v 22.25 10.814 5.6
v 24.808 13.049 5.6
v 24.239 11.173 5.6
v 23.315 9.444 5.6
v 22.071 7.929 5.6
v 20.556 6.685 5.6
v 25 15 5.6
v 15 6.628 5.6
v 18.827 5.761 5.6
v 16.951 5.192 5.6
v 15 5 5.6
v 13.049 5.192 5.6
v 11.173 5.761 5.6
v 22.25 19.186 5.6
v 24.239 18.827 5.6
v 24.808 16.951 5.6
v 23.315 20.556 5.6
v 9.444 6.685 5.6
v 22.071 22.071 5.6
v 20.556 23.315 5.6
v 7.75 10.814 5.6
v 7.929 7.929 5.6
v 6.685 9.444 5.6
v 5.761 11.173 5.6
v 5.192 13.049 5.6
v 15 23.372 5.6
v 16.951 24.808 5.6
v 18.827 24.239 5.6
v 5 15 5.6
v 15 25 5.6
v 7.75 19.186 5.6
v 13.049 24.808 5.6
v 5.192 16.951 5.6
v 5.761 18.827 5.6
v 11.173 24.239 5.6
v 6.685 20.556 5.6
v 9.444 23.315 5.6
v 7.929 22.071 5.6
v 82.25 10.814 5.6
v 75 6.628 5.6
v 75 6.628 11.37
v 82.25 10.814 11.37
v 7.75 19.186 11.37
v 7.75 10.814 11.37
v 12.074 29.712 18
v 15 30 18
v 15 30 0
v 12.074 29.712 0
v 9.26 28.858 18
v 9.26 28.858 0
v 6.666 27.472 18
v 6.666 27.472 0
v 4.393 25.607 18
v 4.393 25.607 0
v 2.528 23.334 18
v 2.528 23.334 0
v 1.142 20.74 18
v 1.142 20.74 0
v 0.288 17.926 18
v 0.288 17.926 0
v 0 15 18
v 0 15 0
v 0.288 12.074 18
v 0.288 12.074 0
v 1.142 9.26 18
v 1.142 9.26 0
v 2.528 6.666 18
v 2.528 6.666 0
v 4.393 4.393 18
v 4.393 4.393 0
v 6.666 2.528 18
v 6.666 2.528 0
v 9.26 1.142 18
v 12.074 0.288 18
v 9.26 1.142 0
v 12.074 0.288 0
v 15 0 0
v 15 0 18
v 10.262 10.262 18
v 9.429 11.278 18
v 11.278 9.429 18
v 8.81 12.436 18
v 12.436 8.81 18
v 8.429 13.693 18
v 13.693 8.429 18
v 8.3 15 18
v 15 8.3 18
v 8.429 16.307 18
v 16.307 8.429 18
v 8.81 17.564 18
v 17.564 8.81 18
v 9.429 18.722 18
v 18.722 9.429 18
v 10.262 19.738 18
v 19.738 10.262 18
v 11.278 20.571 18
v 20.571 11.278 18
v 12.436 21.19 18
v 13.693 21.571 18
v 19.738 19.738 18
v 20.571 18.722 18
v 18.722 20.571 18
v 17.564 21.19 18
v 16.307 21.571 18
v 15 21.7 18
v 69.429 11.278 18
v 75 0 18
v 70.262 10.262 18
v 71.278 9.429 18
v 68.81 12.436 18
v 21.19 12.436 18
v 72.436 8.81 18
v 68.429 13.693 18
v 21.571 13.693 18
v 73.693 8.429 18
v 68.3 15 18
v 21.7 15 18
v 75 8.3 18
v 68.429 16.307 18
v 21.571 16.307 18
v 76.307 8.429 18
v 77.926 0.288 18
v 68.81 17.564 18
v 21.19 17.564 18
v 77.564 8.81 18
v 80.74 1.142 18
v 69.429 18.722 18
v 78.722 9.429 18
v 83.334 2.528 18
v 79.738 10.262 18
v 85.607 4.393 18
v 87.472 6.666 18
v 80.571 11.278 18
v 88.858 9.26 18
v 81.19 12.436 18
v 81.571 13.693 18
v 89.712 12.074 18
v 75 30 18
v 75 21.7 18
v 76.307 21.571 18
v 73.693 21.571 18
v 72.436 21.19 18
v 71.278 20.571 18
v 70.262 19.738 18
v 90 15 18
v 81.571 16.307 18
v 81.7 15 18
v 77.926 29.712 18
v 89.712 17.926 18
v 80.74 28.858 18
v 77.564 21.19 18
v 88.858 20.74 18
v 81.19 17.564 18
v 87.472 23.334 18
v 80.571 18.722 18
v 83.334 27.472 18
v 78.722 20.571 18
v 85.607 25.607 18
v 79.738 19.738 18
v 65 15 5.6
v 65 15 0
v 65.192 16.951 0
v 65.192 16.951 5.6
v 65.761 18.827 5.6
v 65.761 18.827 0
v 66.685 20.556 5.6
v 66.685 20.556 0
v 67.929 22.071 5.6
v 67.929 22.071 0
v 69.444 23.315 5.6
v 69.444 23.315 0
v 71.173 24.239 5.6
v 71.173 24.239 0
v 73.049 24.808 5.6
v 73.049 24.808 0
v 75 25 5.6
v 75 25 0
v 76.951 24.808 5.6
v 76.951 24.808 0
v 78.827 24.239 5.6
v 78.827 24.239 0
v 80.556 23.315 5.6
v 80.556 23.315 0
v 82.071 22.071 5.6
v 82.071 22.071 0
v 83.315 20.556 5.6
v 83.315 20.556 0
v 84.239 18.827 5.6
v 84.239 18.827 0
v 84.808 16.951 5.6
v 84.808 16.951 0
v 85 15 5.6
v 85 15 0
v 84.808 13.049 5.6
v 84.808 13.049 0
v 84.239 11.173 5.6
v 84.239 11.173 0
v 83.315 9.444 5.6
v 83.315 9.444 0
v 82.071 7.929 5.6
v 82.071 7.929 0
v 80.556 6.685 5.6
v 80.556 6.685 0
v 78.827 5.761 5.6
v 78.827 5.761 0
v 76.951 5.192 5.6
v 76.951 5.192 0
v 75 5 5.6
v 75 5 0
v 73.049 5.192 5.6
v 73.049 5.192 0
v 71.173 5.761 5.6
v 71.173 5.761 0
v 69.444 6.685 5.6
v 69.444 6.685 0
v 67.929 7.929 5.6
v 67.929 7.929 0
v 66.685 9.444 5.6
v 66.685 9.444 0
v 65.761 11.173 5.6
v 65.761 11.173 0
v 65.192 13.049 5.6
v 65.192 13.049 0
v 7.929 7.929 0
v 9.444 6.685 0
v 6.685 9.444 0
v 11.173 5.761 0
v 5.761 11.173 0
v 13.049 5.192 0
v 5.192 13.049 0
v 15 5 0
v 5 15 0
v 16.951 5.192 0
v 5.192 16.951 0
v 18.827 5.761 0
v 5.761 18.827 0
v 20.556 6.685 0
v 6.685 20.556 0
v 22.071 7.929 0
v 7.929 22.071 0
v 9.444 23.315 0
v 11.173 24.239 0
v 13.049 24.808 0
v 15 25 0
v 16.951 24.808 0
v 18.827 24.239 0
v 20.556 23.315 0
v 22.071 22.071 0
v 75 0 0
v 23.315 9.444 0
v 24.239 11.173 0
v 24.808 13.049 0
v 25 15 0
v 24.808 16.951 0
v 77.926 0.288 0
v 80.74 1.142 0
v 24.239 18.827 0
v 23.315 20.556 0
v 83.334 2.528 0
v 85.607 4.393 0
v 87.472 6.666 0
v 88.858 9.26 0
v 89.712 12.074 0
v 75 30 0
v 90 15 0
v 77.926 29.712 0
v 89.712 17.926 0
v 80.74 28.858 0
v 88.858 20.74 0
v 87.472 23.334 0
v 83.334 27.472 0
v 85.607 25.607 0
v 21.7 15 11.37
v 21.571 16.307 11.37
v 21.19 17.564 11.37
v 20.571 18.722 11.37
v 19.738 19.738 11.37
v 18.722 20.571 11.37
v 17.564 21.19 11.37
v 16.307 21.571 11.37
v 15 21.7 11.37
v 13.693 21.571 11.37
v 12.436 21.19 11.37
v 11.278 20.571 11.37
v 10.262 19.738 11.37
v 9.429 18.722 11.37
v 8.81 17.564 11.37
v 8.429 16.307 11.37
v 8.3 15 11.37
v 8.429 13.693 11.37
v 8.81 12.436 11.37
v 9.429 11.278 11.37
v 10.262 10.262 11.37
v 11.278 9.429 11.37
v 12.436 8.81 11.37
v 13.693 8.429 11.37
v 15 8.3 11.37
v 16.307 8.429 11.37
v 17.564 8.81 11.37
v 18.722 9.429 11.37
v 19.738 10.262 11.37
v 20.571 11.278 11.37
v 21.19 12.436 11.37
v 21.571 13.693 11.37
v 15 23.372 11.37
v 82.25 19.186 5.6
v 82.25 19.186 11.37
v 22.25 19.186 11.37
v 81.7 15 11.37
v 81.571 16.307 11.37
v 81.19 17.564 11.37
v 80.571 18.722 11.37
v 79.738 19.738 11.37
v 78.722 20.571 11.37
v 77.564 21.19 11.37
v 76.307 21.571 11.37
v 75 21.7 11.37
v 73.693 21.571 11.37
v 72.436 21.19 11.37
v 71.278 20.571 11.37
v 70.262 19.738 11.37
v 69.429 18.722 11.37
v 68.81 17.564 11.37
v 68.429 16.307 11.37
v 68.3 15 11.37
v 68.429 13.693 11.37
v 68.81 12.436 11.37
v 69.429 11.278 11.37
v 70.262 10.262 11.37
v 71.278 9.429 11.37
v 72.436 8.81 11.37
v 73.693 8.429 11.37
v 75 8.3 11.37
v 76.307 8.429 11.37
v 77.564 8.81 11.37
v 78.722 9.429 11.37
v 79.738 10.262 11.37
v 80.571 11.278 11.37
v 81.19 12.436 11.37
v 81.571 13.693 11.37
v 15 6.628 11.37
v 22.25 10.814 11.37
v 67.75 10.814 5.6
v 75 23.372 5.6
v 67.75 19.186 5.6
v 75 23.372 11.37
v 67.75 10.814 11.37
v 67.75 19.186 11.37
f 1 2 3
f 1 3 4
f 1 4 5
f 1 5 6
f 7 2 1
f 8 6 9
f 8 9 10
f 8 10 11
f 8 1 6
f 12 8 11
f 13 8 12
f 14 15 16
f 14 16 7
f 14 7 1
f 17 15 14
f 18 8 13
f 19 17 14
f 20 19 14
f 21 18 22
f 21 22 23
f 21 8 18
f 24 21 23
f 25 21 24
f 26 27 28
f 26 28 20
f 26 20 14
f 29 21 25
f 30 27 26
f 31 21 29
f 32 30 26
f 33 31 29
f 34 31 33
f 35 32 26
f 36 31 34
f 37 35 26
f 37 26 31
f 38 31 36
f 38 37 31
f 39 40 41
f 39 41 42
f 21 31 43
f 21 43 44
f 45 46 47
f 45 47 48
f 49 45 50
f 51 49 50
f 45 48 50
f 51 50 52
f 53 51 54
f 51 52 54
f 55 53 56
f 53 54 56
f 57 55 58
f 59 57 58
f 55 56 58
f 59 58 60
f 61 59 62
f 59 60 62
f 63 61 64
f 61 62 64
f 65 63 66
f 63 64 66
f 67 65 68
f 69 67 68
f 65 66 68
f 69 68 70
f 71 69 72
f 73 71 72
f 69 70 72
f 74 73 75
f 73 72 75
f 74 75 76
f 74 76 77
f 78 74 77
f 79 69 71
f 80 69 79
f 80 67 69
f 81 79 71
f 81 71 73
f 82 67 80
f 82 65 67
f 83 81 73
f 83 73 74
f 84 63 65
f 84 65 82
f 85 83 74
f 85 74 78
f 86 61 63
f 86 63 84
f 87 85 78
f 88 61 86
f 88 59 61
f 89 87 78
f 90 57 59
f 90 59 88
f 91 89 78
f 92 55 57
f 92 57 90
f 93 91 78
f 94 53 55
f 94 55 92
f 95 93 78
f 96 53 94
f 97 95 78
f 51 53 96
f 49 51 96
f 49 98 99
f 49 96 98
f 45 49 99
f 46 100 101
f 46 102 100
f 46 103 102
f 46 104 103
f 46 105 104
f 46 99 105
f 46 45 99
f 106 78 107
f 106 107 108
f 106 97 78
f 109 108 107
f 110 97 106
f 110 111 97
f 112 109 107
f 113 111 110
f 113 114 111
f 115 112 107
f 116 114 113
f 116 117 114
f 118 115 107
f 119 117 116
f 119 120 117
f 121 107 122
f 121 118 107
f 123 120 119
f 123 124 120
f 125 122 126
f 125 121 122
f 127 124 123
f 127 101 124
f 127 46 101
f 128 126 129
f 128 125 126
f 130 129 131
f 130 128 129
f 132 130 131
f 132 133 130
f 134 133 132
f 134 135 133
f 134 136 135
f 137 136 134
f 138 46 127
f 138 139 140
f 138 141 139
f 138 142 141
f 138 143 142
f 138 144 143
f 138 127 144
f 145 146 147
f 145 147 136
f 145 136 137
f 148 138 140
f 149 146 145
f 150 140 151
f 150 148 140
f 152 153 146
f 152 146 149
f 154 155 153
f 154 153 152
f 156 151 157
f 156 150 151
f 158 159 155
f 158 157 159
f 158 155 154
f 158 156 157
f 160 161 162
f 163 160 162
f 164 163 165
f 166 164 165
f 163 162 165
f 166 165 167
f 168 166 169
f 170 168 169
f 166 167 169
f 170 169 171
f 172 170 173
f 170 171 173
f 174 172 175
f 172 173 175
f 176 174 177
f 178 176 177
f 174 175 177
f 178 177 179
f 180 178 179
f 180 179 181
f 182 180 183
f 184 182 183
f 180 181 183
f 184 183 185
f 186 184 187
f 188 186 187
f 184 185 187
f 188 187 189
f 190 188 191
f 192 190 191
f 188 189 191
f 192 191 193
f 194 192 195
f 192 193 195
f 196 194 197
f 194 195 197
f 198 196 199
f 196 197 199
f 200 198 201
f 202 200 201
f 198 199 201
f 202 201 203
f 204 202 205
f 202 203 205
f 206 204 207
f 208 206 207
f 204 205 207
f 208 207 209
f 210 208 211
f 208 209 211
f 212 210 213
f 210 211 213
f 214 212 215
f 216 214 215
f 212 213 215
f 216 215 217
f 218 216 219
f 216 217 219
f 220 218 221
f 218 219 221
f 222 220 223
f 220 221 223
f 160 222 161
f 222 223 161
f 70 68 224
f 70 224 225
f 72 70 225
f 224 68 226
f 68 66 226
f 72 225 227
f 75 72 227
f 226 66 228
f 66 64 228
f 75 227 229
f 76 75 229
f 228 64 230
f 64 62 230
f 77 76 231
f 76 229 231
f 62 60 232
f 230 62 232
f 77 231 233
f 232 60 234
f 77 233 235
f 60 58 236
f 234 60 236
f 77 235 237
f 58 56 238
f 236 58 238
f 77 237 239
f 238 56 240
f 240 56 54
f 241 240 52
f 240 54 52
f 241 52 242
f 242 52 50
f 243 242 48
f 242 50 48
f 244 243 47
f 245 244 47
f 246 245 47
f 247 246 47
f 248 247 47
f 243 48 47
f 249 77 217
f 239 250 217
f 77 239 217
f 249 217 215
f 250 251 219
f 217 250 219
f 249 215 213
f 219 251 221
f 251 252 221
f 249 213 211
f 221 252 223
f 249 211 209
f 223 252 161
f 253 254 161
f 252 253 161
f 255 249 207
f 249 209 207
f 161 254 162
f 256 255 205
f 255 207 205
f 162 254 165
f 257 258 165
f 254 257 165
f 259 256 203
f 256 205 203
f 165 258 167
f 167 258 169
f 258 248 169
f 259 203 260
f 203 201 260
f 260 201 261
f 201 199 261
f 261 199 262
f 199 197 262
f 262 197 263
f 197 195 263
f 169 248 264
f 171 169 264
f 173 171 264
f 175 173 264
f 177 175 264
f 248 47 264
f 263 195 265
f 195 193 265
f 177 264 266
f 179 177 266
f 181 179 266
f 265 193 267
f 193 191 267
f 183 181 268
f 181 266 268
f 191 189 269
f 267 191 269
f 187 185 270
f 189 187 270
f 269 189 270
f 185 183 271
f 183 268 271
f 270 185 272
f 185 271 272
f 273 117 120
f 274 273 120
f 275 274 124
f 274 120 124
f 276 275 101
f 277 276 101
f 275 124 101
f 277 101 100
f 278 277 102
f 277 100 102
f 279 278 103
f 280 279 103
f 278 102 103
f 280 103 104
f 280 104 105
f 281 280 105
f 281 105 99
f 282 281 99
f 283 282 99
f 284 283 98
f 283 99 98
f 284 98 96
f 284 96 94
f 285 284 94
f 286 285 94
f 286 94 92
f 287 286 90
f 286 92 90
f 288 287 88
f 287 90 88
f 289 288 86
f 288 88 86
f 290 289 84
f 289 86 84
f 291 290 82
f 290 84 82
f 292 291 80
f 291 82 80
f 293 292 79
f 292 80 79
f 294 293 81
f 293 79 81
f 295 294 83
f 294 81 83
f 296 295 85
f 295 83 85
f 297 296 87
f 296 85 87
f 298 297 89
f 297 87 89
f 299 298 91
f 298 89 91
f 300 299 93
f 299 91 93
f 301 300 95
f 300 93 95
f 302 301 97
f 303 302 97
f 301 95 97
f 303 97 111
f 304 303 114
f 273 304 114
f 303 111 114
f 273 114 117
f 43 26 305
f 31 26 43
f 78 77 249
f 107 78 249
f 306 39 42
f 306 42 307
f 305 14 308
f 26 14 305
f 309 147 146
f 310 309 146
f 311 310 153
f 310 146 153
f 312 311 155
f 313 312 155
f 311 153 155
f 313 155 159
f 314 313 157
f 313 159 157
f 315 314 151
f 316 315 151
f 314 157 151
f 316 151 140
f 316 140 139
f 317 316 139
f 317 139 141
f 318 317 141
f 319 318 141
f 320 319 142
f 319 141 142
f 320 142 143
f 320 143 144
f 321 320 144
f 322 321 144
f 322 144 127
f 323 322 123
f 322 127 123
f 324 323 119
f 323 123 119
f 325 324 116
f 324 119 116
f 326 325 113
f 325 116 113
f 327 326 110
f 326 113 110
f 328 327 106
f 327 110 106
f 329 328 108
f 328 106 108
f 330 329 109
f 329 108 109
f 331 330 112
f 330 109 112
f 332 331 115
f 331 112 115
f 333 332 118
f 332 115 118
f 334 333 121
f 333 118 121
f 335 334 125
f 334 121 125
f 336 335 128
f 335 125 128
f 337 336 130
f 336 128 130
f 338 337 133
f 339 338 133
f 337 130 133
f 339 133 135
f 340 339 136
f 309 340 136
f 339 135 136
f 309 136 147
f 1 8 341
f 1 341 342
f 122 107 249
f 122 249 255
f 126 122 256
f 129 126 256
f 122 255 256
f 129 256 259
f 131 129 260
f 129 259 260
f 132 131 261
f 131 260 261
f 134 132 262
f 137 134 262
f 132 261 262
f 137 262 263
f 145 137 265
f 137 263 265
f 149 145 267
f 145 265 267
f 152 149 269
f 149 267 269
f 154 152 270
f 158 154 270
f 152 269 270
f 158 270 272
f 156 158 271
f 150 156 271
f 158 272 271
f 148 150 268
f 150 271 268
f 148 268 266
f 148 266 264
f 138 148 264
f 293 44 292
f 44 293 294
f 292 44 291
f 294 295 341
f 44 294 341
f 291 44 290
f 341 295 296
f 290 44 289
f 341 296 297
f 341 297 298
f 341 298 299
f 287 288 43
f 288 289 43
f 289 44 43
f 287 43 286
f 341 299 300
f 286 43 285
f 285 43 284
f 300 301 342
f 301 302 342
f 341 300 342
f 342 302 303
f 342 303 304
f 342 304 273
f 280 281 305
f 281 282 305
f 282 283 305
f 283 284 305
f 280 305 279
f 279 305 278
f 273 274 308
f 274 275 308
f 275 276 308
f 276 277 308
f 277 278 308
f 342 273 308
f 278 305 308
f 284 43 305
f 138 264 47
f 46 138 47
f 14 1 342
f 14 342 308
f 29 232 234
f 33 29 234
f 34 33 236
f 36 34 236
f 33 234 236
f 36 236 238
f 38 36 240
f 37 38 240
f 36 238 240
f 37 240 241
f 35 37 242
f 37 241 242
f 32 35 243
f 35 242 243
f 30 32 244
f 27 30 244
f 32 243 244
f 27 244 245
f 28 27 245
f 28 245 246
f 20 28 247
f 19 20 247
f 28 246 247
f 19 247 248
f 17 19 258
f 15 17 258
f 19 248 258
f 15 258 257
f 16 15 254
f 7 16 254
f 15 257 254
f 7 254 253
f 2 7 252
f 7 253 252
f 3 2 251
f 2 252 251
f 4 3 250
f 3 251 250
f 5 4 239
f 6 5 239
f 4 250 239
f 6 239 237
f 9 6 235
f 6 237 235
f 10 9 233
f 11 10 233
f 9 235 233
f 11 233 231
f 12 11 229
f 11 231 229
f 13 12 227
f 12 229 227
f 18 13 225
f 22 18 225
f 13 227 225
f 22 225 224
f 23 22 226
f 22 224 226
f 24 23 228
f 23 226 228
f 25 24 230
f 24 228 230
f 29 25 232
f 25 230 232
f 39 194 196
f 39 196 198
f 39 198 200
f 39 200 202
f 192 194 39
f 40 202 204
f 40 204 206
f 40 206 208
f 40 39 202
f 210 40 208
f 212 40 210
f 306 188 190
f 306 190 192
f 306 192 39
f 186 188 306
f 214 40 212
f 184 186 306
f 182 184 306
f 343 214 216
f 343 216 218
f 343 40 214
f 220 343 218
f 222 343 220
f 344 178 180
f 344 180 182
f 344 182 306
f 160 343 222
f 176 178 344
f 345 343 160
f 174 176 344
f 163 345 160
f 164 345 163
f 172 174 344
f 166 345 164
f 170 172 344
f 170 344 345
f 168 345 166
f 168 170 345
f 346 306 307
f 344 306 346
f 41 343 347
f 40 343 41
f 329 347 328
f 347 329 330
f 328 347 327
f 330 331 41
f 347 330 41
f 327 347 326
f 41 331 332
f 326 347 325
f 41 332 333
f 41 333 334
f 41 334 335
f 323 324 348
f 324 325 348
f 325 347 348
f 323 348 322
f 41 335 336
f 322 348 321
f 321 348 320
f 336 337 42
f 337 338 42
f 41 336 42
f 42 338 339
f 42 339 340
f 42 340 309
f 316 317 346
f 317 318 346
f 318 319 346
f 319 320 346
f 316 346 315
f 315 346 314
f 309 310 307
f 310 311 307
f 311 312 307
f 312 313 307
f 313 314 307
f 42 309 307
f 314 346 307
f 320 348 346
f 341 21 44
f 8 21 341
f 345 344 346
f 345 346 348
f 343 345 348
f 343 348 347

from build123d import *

# Parameters (mm, degrees)
BOSS_EXTRUDE1_DEPTH = 18
SKETCH2_R           = 10
CUT_EXTRUDE1_DEPTH  = 5.6
SKETCH3_R           = 8.371578903
SKETCH3_R_2         = 6.7
BOSS_EXTRUDE2_DEPTH = 6.63


with BuildPart() as part:
    # Sketch1 → Boss-Extrude1 (new body)
    with BuildSketch(Plane.XY):
        with BuildLine():
            Line((15, 0), (75, 0))
            ThreePointArc((75, 0), (90, 15), (75, 30))
            Line((75, 30), (15, 30))
            ThreePointArc((15, 30), (0, 15), (15, 0))
        make_face()
        Polygon((15, 23.371578903), (7.75, 19.185789452), (7.75, 10.814210548), (15, 6.628421097), (22.25, 10.814210548), (22.25, 19.185789452), align=None, mode=Mode.SUBTRACT)
        Polygon((75, 23.371578903), (67.75, 19.185789452), (67.75, 10.814210548), (75, 6.628421097), (82.25, 10.814210548), (82.25, 19.185789452), align=None, mode=Mode.SUBTRACT)
    extrude(amount=BOSS_EXTRUDE1_DEPTH)

    # Sketch2 → Cut-Extrude1 (cut)
    with BuildSketch(Plane(origin=(0, 0, 0), x_dir=(-1, 0, 0), z_dir=(0, 0, -1))):
        with Locations((-75, 15)):
            Circle(SKETCH2_R)
        with Locations((-15, 15)):
            Circle(SKETCH2_R)
    extrude(amount=-CUT_EXTRUDE1_DEPTH, mode=Mode.SUBTRACT)

    # Sketch3 → Boss-Extrude2 (add)
    # profile 1 of 2: a face of its own
    with BuildSketch(Plane.XY.offset(18)):
        with Locations((75, 15)):
            Circle(SKETCH3_R)
        with Locations((75, 15)):
            Circle(SKETCH3_R_2, mode=Mode.SUBTRACT)
    # profile 2 of 2: a face of its own
    with BuildSketch(Plane.XY.offset(18)):
        with Locations((15, 15)):
            Circle(SKETCH3_R)
        with Locations((15, 15)):
            Circle(SKETCH3_R_2, mode=Mode.SUBTRACT)
    extrude(amount=-BOSS_EXTRUDE2_DEPTH)


solid = part.part
